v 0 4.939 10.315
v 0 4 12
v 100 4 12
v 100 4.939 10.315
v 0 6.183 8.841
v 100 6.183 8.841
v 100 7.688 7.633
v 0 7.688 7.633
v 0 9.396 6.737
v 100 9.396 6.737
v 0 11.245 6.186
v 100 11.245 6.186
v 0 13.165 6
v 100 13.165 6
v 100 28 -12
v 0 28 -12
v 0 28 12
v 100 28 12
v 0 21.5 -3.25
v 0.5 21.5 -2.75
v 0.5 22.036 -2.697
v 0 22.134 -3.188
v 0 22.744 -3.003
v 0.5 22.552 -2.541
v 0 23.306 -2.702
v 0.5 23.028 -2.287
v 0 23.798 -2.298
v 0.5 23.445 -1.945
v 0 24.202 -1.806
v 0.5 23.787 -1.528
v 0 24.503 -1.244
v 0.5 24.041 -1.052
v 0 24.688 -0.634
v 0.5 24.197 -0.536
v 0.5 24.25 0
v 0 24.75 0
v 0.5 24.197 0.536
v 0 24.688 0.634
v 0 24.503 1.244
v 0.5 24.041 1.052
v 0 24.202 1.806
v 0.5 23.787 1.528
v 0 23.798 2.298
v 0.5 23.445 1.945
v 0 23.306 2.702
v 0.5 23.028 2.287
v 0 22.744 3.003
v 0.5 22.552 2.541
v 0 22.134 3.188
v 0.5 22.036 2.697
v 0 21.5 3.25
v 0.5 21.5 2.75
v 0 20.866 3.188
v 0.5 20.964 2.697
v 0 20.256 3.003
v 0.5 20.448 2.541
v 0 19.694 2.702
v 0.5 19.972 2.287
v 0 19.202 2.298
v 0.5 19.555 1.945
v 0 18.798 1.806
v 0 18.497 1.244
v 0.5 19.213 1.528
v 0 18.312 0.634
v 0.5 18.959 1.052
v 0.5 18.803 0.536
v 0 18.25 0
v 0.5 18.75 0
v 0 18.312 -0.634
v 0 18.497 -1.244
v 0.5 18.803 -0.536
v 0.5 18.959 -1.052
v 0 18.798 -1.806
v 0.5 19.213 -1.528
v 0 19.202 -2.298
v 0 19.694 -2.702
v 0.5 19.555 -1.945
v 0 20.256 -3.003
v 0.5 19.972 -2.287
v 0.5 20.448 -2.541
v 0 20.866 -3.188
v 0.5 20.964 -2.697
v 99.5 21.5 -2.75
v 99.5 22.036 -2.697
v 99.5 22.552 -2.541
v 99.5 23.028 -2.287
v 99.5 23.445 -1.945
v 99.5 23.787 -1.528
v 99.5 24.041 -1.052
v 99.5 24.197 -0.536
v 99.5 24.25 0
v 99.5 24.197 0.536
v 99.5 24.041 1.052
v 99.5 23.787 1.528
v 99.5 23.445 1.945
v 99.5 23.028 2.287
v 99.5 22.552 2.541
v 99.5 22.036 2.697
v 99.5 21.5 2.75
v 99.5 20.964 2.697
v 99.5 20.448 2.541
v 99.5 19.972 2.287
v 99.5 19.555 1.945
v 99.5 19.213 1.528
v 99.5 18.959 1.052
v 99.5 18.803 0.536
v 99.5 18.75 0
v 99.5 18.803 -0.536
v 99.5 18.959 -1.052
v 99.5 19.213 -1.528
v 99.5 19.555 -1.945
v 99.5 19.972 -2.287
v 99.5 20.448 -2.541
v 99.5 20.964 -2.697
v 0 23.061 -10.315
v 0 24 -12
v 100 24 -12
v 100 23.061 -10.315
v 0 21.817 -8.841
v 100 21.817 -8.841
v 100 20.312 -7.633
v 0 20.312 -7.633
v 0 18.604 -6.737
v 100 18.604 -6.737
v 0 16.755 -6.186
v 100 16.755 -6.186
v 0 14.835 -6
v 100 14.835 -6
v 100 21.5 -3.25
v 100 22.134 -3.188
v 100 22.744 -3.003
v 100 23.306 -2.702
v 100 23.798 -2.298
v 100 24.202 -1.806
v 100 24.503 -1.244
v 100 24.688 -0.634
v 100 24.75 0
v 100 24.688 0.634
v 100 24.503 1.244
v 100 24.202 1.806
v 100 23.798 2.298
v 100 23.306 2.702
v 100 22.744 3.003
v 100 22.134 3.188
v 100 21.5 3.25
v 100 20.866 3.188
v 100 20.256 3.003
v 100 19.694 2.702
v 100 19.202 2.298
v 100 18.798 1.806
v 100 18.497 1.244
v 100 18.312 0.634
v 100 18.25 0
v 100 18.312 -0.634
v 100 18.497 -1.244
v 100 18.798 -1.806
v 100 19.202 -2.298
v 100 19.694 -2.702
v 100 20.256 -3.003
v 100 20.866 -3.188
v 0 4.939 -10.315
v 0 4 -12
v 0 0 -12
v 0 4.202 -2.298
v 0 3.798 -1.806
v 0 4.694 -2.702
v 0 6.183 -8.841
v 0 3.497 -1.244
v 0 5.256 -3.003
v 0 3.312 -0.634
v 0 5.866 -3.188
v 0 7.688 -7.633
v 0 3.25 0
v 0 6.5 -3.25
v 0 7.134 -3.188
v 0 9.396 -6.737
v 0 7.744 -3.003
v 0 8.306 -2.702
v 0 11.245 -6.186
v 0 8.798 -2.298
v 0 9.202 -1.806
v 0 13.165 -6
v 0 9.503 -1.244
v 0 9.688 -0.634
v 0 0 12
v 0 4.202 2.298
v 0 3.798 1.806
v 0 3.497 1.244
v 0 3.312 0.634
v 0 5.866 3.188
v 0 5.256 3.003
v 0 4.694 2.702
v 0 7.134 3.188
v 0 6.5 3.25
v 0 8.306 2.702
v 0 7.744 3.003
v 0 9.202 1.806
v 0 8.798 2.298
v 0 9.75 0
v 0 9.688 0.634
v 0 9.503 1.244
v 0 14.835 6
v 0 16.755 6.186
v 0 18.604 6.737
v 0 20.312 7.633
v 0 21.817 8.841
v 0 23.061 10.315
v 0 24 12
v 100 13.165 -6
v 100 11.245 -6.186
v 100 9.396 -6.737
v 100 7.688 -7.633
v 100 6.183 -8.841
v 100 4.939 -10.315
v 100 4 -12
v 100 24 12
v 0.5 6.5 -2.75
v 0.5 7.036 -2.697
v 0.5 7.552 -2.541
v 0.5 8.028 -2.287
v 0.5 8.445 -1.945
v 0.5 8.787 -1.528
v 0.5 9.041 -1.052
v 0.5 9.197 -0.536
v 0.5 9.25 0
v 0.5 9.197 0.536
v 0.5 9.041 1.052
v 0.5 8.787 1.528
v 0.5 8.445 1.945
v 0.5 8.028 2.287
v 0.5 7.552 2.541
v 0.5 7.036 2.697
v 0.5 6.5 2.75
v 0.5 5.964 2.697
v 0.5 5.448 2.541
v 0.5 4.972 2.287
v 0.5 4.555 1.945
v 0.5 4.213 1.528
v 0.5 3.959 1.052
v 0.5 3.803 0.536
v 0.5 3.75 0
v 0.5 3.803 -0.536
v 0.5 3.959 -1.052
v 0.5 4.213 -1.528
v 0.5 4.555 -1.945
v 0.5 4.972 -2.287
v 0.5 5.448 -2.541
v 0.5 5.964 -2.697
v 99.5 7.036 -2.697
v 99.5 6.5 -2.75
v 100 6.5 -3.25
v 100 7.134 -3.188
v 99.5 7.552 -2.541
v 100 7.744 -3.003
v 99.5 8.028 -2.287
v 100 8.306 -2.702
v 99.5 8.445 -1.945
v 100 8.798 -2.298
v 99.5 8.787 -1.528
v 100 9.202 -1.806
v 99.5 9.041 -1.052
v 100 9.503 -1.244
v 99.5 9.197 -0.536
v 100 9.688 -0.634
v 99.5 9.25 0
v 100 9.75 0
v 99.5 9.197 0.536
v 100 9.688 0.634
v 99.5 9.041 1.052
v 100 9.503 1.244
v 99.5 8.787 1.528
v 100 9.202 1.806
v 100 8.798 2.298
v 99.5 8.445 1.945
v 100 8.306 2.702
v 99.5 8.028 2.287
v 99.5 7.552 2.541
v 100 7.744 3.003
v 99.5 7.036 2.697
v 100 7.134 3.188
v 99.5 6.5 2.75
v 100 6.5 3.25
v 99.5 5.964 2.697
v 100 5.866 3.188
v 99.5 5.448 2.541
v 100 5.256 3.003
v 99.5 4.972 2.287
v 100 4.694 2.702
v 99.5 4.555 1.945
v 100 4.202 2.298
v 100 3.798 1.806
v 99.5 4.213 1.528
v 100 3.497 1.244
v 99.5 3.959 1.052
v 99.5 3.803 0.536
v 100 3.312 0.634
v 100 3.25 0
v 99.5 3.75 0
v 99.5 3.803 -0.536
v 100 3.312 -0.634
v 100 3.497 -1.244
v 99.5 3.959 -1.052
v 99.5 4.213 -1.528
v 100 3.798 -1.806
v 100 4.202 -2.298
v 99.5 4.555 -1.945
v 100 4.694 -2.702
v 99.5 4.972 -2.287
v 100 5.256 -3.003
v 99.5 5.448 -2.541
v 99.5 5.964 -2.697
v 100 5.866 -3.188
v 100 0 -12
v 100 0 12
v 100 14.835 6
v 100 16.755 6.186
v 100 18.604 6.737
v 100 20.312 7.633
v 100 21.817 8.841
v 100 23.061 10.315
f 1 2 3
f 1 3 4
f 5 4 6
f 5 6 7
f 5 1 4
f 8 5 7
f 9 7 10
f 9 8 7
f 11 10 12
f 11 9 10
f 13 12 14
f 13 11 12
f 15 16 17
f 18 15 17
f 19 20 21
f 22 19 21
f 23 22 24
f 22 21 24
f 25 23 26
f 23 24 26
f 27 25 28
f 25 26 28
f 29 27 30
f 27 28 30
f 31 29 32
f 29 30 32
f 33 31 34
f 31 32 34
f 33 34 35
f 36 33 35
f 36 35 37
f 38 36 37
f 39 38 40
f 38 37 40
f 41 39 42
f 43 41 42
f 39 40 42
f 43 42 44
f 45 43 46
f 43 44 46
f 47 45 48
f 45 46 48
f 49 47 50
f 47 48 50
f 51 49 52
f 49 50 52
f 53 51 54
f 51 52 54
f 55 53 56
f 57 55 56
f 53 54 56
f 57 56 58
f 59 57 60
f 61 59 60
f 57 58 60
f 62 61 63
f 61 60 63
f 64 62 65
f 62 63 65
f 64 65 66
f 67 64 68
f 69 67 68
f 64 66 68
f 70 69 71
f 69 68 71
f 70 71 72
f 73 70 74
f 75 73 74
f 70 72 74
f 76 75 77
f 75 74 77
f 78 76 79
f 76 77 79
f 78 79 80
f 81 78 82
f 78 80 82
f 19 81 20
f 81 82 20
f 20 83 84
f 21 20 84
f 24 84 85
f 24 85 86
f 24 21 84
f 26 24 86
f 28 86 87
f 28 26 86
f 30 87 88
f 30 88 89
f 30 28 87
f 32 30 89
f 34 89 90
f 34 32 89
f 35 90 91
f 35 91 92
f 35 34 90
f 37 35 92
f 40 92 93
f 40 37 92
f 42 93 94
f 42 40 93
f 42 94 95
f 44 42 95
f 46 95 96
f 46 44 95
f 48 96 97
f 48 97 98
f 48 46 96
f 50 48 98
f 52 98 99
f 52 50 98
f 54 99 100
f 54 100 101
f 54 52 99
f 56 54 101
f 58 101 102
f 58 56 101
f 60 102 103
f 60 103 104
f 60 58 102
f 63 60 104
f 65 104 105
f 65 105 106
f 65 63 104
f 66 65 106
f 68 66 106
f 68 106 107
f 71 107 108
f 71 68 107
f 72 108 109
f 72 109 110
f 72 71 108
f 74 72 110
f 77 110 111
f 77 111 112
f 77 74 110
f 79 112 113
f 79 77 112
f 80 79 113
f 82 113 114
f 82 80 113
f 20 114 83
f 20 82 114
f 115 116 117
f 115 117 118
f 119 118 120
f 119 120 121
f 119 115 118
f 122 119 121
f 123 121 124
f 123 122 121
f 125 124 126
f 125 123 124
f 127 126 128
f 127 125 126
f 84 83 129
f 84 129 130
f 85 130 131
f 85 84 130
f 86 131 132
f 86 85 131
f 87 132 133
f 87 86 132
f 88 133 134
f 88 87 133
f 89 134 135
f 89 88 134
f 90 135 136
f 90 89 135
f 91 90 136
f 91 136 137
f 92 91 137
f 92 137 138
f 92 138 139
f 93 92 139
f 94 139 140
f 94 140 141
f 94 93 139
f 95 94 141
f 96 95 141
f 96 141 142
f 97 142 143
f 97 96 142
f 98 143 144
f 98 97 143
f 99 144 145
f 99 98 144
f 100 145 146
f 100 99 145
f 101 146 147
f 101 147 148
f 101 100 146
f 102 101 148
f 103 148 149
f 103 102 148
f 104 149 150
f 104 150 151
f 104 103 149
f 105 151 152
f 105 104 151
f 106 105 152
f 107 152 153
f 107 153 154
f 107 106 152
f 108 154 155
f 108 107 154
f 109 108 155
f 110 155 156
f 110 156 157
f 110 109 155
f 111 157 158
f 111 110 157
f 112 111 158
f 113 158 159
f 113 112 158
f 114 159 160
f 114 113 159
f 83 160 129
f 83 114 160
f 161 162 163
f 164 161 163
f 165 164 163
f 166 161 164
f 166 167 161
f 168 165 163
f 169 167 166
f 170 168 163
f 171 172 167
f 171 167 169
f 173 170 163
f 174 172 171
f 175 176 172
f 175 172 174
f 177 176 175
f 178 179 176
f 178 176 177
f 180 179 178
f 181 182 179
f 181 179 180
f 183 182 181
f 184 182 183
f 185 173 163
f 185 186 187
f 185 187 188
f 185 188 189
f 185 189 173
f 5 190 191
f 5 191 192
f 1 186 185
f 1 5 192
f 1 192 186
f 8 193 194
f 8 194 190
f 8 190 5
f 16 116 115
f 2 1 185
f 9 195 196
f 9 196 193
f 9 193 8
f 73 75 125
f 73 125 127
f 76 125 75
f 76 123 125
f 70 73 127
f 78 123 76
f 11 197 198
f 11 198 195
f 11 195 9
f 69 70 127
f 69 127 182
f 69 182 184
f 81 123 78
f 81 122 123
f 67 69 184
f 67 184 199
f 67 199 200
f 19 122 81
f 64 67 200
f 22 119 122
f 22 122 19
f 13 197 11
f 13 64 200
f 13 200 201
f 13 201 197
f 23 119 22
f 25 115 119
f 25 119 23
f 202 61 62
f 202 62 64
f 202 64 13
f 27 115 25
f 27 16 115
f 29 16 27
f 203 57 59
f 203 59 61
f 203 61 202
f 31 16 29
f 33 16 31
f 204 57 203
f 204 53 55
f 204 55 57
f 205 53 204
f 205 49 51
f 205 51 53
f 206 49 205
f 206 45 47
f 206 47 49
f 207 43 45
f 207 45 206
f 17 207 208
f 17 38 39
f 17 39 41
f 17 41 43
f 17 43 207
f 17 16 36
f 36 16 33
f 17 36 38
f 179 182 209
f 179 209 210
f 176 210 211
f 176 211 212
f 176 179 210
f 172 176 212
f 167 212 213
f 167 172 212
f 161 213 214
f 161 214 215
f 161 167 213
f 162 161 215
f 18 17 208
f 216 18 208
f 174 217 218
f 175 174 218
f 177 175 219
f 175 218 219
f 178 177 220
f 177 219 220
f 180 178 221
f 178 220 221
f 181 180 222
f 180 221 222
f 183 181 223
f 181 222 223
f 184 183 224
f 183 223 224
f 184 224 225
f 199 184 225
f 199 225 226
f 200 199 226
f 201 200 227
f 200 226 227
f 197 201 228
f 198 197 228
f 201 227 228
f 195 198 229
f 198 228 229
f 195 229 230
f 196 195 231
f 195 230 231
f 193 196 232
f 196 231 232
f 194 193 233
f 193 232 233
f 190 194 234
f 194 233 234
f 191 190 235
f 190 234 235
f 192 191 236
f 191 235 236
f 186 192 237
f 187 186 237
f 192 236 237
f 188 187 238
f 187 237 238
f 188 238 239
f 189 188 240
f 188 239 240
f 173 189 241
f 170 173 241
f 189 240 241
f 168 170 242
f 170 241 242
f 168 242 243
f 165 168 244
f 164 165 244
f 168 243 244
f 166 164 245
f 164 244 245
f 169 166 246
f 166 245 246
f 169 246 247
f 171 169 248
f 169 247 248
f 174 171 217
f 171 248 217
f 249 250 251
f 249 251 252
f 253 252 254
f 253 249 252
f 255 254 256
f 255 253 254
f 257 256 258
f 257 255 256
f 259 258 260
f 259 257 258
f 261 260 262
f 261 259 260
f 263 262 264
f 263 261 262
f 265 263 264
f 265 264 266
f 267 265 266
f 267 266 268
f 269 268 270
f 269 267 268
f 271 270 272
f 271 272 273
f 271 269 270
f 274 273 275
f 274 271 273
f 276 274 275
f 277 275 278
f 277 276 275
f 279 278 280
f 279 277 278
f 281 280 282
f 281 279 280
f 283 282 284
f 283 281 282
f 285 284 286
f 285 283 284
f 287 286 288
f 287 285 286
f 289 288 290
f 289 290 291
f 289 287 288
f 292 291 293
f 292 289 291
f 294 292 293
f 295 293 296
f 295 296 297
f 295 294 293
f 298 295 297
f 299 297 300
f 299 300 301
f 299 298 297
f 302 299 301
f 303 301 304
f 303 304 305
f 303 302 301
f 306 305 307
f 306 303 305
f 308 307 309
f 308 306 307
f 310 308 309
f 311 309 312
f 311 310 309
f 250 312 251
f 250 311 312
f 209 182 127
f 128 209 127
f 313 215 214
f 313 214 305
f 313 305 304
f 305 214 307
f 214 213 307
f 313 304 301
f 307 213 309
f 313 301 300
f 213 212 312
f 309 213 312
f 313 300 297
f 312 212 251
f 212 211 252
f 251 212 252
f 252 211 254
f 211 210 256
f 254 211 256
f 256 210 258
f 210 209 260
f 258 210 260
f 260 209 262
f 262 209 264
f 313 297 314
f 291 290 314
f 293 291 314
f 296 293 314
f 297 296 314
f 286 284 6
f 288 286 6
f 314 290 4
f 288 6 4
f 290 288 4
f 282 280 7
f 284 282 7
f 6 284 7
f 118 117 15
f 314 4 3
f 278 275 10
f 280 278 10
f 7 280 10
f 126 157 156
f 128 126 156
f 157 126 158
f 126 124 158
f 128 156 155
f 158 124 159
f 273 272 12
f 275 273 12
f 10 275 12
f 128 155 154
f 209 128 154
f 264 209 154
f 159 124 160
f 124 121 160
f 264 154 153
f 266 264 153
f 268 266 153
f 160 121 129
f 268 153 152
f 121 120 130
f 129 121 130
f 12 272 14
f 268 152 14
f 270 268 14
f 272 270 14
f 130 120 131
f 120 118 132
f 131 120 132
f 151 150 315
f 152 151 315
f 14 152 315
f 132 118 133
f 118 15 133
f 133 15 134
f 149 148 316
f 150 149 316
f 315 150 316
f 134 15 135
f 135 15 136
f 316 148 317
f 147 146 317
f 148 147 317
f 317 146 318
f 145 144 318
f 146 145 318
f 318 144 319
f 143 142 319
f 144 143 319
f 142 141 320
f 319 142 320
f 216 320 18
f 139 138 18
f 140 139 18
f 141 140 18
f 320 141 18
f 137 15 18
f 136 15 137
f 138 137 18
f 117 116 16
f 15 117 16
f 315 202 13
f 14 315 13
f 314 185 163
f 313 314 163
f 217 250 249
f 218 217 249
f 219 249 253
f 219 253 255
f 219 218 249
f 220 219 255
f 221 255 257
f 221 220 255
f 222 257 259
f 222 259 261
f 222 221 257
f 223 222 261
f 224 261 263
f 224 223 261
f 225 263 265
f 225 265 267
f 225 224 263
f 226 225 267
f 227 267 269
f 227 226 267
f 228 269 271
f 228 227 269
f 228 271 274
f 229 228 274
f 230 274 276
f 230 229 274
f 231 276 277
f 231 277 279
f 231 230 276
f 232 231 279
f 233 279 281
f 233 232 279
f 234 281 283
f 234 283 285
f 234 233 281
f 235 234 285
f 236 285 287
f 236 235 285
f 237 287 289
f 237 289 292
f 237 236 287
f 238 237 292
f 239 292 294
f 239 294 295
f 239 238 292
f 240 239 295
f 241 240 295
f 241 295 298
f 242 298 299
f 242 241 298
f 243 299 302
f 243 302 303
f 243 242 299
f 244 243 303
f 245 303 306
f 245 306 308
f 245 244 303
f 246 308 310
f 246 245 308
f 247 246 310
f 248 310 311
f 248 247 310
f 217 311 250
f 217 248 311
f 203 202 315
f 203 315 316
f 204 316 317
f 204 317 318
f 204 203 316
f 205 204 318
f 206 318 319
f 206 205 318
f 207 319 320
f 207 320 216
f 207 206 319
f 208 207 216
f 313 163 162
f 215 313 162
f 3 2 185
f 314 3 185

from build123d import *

# Parameters (mm, degrees)
SKETCH_1_R      = 2.75
EXTRUDE_1_DEPTH = 100
FILLET_1_R      = 10
CHAMFER_1_SIZE  = 0.5


with BuildPart() as part:
    # 草图1 → 凸台-拉伸1 (new body)
    with BuildSketch(Plane(origin=(0, 0, 0), x_dir=(0, 0, -1), z_dir=(1, 0, 0))):
        Polygon((-12, 0), (12, 0), (12, 4), (6, 4), (6, 24), (12, 24), (12, 28), (-12, 28), (-12, 24), (-6, 24), (-6, 4), (-12, 4), align=None)
        with Locations((0, 21.5)):
            Circle(SKETCH_1_R, mode=Mode.SUBTRACT)
        with Locations((0, 6.5)):
            Circle(SKETCH_1_R, mode=Mode.SUBTRACT)
    extrude(amount=EXTRUDE_1_DEPTH)

    # 圆角1
    # the kernel refuses this fillet: 10 mm, written as the material it adds along each edge
    with BuildSketch(Plane(origin=(0, 24, -6), x_dir=(0, -1, 0), z_dir=(1, 0, 0)), Plane(origin=(0, 4, 6), x_dir=(0, 1, 0), z_dir=(1, 0, 0))) as fillet_1_piece_1:
        with BuildLine():
            CenterArc((9.16515139, 10), FILLET_1_R, 203.578178478, 66.421821522)
            Line((0, 6), (-0.183303028, 5.92))
            ThreePointArc((-0.183303028, 5.92), (-0.2, 3), (-0.2, 0))
            Line((-0.2, 0), (0, -0.2))
            Line((0, -0.2), (9.16515139, -0.2))
            Line((9.16515139, -0.2), (9.16515139, 0))
        make_face()
    extrude(amount=100)
    with BuildSketch(Plane(origin=(0, 4, -6), x_dir=(0, 0, -1), z_dir=(1, 0, 0)), Plane(origin=(0, 24, 6), x_dir=(0, 0, 1), z_dir=(1, 0, 0))) as fillet_1_piece_2:
        with BuildLine():
            CenterArc((10, 9.16515139), FILLET_1_R, 180, 66.421821522)
            Line((0, 9.16515139), (-0.2, 9.16515139))
            Line((-0.2, 9.16515139), (-0.2, 0))
            Line((-0.2, 0), (0, -0.2))
            ThreePointArc((0, -0.2), (3, -0.2), (5.92, -0.183303028))
            Line((5.92, -0.183303028), (6, 0))
        make_face()
    extrude(amount=100)

    # 倒角1
    chamfer_1_edges = [part.edges().sort_by_distance(p)[0] for p in [
        (0, 21.5, 2.75),
        (100, 21.5, 2.75),
        (0, 6.5, 2.75),
        (100, 6.5, 2.75),
    ]]
    chamfer(chamfer_1_edges, length=CHAMFER_1_SIZE)


solid = part.part
